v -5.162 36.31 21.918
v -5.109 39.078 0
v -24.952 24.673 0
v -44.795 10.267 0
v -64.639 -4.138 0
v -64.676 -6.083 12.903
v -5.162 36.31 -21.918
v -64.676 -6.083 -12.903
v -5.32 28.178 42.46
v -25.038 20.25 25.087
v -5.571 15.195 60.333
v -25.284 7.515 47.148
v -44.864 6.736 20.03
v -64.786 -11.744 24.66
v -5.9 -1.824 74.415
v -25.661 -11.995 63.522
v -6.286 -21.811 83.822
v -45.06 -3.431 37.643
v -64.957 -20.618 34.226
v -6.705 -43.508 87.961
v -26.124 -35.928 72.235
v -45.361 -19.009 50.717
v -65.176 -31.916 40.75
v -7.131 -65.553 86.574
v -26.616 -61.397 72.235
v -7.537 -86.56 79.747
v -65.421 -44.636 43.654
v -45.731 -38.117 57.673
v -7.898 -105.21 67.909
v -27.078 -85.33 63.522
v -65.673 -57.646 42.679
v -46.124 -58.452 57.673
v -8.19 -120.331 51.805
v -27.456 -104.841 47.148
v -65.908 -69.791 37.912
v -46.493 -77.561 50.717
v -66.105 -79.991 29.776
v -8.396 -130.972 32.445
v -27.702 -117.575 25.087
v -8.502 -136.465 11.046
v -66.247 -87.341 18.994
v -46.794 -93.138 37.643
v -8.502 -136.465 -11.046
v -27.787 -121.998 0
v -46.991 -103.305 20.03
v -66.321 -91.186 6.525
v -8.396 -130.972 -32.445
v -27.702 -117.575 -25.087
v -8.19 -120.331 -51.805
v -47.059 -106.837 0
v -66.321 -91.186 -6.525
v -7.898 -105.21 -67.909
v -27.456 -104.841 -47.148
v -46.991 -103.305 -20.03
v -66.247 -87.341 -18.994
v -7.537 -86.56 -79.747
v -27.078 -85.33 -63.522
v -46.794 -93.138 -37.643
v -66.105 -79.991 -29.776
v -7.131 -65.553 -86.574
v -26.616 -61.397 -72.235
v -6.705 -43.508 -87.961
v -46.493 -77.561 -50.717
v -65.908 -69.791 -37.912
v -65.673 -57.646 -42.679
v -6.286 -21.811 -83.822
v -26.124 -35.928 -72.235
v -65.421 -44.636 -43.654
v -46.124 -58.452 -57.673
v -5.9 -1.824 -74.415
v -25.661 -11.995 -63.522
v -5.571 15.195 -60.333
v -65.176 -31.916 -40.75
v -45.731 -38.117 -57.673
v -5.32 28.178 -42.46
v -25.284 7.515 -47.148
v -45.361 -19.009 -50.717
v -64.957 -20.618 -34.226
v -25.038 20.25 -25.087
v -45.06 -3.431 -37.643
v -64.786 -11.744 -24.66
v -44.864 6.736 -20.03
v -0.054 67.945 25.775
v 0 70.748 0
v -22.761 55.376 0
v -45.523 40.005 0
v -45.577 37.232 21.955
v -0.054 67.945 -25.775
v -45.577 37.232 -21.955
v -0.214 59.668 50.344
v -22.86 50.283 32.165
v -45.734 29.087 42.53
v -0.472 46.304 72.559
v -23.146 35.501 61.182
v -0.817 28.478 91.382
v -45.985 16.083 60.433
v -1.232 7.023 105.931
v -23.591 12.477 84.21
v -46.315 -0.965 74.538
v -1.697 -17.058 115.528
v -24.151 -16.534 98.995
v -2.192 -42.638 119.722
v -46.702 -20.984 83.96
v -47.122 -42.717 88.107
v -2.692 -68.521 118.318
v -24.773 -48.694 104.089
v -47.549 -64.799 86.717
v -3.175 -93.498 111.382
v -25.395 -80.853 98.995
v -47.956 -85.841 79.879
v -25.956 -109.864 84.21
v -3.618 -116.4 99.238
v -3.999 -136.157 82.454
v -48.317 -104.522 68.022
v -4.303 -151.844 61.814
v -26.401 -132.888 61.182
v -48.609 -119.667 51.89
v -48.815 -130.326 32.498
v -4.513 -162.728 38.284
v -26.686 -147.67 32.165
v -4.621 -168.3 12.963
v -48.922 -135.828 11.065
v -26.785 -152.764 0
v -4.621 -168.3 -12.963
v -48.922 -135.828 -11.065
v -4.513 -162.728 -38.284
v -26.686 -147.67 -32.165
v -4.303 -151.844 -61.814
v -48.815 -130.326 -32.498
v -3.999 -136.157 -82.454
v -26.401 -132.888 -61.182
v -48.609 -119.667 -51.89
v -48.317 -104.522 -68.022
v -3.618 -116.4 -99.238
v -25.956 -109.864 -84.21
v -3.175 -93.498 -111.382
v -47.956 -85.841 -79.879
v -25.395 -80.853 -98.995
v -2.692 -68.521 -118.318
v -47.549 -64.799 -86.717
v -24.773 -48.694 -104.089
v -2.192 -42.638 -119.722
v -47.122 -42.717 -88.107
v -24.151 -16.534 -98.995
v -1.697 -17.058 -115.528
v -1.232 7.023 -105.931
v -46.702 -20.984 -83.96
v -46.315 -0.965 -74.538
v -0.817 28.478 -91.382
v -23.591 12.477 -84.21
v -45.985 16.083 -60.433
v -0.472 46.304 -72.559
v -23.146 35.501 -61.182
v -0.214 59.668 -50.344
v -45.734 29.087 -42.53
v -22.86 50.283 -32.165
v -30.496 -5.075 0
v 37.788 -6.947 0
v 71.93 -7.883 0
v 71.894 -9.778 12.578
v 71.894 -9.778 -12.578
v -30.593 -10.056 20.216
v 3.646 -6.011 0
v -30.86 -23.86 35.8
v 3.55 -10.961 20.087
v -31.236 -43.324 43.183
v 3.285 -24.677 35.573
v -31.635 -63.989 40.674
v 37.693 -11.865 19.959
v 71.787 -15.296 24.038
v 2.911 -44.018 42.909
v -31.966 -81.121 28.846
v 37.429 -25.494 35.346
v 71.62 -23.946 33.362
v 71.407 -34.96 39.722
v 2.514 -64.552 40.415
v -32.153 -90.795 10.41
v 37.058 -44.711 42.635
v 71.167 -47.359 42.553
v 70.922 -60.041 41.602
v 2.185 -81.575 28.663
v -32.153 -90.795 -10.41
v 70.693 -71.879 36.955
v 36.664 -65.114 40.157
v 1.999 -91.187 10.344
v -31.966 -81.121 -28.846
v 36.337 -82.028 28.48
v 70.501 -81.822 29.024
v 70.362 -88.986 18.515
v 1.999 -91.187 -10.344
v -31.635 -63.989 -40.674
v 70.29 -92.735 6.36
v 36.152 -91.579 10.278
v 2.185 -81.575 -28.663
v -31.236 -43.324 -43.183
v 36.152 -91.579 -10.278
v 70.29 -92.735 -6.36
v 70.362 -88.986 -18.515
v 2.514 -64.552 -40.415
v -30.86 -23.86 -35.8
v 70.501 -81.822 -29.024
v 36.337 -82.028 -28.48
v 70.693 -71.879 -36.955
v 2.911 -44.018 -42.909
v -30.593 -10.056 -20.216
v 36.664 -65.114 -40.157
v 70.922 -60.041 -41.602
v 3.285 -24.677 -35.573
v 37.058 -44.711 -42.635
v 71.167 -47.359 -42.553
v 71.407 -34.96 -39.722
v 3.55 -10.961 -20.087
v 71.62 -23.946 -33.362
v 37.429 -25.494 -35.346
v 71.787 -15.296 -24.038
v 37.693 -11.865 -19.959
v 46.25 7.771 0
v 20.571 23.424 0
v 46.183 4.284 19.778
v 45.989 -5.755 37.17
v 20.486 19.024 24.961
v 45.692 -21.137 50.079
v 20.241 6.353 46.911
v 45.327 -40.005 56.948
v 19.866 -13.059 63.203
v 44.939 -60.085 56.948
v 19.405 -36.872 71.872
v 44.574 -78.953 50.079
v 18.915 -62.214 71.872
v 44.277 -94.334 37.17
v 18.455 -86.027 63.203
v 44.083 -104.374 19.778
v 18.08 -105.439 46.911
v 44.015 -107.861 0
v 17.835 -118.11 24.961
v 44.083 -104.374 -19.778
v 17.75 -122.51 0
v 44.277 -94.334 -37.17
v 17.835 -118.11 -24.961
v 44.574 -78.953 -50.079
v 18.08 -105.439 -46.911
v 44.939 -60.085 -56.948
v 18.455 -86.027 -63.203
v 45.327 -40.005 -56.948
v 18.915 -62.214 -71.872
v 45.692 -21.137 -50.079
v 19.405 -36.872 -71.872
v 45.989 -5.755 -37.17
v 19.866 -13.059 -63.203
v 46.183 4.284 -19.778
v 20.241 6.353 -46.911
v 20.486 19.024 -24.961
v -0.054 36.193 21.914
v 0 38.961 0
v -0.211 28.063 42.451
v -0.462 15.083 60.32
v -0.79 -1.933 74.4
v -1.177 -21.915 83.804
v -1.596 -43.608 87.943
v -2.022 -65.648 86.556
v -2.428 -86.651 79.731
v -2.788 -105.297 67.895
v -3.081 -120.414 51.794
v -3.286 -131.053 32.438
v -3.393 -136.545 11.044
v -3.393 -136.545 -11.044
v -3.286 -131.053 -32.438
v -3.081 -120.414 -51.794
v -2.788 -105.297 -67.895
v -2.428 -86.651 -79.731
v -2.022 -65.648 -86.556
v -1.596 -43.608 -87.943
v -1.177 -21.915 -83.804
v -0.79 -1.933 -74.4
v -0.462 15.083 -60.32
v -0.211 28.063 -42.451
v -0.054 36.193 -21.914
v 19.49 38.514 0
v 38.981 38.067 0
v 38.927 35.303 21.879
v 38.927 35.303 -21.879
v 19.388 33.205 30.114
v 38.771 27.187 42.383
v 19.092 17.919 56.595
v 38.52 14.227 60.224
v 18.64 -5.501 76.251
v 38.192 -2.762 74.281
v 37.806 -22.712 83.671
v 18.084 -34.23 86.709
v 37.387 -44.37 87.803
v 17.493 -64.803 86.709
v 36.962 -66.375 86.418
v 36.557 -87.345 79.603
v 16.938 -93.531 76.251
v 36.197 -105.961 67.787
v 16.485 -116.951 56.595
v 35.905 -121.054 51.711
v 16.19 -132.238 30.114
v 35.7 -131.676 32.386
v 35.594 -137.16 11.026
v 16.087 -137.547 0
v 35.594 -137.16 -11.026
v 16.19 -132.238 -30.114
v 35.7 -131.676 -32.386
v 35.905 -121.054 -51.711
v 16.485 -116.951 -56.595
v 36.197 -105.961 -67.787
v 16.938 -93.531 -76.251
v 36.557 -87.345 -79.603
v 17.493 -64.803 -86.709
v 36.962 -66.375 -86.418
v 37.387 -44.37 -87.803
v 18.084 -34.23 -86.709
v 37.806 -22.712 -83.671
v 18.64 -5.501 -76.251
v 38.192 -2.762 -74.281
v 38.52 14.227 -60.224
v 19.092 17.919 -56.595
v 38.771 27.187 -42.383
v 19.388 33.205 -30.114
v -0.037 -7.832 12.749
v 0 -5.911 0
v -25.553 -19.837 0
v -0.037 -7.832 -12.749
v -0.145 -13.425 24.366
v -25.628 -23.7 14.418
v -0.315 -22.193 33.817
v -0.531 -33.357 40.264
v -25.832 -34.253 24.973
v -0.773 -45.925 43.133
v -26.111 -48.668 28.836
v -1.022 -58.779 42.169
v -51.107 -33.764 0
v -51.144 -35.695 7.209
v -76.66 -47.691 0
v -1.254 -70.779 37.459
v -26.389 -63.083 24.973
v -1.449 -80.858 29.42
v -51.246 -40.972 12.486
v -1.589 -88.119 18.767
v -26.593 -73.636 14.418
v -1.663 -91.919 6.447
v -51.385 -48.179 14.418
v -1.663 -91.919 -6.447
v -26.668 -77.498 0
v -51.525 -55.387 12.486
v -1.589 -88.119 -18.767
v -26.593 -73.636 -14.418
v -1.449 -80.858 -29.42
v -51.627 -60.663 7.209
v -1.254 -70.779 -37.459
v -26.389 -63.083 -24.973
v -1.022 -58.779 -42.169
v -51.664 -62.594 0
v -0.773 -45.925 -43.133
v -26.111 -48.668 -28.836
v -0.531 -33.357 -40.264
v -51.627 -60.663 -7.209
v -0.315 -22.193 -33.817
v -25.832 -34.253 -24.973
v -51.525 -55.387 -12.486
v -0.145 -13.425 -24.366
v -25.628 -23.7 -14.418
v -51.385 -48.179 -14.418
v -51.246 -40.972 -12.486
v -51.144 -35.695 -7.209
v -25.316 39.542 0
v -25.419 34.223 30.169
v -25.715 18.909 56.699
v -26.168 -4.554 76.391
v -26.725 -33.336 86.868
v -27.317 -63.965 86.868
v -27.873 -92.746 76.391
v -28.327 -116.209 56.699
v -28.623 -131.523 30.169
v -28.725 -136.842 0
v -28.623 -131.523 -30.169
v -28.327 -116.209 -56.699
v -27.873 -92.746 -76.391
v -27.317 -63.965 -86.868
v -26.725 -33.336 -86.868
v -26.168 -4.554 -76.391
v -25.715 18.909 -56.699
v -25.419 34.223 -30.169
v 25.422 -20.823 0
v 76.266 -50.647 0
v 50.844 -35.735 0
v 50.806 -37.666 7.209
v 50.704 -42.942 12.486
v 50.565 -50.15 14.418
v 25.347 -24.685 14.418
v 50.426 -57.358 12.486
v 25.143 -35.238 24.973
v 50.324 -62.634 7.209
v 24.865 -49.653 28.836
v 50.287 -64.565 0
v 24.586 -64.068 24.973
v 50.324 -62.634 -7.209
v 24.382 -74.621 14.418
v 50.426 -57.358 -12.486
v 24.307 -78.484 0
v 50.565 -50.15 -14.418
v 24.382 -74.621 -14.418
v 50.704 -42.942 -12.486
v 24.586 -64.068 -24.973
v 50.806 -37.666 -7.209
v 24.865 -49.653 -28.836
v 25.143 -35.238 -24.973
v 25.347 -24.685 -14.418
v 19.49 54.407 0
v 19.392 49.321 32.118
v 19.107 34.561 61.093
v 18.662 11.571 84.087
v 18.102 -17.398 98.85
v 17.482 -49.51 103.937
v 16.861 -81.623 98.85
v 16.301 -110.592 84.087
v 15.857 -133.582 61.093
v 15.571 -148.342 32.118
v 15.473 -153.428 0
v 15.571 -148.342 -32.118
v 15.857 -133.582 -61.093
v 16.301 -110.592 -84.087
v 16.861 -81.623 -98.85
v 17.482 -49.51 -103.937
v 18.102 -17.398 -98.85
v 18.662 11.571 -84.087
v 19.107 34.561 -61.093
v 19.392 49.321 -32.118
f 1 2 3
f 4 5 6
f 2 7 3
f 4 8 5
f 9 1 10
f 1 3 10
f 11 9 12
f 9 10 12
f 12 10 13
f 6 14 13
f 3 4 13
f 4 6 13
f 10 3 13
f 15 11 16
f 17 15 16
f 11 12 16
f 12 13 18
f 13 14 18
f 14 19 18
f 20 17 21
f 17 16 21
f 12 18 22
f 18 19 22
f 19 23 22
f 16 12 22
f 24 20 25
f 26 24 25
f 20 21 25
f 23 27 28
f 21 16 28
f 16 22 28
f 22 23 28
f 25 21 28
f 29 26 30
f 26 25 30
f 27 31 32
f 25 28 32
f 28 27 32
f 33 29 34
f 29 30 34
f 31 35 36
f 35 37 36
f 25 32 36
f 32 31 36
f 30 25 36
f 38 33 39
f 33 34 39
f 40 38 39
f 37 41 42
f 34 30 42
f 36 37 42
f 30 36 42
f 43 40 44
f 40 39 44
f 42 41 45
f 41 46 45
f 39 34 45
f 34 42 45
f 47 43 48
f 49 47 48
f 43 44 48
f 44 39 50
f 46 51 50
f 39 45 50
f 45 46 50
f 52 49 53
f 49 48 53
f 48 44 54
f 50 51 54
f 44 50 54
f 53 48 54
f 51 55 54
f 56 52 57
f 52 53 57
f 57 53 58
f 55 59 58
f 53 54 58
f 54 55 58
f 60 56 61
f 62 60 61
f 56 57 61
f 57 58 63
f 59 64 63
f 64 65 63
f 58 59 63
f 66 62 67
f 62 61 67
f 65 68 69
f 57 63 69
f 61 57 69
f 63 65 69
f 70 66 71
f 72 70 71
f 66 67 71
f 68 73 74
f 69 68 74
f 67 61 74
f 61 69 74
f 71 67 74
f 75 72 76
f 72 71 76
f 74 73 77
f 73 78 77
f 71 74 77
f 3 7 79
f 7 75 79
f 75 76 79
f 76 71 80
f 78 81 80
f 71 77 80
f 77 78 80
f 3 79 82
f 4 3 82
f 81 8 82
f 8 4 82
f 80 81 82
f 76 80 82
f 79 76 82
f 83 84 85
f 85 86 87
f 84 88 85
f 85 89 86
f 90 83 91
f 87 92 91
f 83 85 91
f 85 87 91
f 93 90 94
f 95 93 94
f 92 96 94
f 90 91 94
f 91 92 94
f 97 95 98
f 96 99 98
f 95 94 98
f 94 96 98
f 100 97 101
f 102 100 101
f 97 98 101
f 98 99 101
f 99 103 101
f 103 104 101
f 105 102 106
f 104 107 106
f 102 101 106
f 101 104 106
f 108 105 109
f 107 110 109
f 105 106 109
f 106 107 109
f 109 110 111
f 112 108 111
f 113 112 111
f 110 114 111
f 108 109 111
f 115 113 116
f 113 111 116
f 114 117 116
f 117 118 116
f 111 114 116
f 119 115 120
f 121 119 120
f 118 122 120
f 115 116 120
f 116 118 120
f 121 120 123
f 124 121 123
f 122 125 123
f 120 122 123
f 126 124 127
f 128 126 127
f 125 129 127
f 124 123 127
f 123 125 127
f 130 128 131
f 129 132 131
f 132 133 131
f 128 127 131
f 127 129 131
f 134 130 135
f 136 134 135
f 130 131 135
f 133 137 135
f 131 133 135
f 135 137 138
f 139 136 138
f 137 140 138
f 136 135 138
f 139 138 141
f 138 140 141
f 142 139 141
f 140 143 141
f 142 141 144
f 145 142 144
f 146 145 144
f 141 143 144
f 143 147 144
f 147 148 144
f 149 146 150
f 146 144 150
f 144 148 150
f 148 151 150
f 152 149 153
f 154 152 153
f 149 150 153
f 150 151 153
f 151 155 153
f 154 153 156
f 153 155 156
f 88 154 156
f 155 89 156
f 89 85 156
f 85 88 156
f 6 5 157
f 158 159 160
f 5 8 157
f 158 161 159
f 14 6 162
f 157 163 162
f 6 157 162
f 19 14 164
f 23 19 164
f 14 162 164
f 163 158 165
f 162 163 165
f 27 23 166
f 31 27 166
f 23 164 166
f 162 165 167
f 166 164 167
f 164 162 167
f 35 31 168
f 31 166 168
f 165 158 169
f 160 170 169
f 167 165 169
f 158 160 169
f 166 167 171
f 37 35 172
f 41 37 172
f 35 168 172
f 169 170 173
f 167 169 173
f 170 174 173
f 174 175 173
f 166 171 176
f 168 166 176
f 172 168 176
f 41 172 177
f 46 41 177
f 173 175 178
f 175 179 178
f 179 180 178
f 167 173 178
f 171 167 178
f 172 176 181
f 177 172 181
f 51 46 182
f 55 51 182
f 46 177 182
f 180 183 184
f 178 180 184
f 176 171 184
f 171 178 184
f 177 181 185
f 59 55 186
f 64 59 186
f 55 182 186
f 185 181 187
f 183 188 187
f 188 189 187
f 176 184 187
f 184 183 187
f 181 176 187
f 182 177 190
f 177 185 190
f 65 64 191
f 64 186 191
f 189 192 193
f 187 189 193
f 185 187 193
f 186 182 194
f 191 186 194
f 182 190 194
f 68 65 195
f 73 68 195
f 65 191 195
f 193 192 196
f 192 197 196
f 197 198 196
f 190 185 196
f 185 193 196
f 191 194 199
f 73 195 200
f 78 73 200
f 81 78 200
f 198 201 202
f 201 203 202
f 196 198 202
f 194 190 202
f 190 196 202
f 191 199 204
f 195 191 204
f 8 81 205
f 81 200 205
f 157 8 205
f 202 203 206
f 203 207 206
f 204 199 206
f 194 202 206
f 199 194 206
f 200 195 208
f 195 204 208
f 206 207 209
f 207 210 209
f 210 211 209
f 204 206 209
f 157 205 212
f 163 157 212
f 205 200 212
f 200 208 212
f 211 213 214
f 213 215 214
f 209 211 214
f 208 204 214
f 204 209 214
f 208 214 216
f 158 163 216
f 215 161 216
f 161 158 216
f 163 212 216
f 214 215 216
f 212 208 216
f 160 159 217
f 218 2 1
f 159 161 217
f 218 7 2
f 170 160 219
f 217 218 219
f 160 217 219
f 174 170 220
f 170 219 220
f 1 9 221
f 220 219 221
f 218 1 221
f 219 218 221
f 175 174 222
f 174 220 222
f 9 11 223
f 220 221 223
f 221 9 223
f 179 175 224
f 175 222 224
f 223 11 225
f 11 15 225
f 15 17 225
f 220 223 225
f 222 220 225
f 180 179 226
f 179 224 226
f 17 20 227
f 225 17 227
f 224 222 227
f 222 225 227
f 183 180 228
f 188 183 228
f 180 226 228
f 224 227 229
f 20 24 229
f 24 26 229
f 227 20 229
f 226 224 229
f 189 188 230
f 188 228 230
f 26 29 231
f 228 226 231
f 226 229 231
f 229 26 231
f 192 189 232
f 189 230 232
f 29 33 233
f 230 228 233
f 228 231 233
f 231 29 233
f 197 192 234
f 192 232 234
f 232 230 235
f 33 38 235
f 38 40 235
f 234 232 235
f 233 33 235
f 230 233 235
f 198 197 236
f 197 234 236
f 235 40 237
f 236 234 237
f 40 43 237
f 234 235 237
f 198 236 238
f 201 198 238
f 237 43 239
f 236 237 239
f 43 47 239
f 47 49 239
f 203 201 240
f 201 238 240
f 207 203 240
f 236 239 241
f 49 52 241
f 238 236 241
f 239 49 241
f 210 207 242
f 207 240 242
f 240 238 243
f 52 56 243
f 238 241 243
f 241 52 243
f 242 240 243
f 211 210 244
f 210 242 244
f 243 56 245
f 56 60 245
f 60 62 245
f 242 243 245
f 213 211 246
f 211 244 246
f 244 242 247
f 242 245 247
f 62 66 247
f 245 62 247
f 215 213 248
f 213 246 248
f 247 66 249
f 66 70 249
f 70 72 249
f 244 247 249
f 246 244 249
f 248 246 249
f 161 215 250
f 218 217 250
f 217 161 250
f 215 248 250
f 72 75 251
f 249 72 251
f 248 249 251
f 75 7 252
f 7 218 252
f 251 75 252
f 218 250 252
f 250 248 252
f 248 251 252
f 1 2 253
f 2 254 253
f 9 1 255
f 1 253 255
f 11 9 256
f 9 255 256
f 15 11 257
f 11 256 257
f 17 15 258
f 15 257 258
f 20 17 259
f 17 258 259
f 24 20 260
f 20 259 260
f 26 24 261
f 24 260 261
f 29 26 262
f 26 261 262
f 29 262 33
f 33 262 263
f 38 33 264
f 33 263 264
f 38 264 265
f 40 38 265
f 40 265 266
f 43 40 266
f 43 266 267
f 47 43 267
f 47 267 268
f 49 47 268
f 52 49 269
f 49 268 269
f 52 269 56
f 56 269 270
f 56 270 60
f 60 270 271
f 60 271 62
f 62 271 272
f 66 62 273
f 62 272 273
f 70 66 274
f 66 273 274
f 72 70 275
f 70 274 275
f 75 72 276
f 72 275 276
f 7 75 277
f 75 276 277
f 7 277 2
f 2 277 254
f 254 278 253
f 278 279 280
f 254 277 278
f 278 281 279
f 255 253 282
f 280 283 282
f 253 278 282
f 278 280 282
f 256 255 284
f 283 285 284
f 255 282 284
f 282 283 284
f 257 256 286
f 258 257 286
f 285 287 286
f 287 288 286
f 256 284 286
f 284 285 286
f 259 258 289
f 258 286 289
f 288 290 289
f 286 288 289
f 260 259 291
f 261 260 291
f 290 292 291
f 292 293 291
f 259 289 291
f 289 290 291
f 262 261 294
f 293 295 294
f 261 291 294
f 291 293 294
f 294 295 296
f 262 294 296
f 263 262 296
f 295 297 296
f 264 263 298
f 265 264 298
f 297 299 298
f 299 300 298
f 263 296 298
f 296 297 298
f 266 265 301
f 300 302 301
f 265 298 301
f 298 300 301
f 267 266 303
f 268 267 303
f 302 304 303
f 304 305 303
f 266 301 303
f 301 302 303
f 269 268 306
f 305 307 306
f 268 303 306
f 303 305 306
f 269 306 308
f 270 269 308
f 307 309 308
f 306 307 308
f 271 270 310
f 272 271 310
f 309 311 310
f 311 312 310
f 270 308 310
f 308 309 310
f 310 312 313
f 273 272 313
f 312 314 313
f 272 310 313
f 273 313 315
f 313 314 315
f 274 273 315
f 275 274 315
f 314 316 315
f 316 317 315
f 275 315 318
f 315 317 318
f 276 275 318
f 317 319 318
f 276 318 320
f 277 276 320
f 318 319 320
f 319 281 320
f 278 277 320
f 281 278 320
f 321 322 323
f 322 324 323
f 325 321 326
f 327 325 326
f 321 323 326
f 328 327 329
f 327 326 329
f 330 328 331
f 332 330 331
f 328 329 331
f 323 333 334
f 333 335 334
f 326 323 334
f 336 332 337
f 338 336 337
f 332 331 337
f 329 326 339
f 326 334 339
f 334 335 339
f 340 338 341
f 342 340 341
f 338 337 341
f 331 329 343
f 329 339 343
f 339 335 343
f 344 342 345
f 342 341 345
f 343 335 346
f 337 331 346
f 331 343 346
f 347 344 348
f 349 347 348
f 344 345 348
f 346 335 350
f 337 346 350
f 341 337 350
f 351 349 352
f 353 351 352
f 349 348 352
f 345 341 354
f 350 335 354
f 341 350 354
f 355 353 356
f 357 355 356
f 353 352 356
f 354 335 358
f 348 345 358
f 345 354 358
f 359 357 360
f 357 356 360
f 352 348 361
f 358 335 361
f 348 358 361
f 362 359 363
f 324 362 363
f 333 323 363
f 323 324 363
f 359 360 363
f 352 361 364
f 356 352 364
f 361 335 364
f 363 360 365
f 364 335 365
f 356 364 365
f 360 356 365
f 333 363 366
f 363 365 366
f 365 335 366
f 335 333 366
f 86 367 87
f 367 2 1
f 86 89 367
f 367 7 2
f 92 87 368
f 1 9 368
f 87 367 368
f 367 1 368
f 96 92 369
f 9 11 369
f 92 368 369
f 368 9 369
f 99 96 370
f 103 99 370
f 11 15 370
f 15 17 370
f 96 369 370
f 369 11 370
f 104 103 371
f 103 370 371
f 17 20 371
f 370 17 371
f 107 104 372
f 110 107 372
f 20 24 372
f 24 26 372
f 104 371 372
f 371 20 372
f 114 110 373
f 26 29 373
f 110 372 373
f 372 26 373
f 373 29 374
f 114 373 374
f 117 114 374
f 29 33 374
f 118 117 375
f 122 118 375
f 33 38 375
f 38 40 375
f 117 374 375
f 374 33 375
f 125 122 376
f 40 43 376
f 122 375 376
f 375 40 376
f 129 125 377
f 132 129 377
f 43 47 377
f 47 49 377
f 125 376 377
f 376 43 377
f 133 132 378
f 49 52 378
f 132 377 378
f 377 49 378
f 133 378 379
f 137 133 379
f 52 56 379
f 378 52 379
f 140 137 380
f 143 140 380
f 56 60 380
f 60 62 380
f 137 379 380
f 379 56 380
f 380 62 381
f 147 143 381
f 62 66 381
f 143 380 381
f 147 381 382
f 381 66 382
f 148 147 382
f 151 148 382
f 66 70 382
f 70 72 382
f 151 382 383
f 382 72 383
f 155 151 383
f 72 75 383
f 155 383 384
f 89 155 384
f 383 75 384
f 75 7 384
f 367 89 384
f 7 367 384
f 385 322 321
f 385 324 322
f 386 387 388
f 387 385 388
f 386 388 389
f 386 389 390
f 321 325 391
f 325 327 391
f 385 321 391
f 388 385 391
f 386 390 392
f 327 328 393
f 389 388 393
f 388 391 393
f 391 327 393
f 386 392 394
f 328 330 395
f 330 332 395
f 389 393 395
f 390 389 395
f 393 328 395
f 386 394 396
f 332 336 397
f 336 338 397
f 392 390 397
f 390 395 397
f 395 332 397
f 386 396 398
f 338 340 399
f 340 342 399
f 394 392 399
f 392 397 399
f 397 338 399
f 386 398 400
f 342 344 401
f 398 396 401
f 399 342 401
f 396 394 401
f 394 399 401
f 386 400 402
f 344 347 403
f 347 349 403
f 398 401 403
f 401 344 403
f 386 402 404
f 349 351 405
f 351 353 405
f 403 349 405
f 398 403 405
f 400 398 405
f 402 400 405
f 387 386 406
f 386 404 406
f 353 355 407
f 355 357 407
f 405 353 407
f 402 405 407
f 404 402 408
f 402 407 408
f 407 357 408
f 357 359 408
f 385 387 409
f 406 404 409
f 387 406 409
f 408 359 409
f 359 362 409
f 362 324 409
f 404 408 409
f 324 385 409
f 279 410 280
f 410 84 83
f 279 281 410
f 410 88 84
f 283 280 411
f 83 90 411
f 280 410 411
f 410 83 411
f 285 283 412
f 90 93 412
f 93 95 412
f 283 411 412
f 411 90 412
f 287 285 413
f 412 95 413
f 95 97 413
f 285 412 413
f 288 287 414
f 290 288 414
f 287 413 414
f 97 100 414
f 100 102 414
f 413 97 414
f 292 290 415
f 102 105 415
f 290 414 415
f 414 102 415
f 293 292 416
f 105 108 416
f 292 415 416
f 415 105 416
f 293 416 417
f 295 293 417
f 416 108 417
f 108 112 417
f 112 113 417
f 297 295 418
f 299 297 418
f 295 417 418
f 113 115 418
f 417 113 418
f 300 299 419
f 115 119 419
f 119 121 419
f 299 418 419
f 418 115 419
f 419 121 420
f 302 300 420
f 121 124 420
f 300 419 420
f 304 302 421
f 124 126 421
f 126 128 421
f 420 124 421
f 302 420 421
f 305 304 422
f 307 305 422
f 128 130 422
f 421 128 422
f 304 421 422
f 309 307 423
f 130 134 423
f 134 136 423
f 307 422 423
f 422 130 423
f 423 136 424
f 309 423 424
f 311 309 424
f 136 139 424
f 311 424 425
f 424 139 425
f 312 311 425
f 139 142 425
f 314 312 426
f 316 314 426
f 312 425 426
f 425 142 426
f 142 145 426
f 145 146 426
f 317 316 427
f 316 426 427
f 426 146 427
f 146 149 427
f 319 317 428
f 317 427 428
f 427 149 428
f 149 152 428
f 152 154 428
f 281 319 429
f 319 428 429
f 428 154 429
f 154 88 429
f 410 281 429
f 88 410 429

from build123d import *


with BuildPart() as f1:
    # F0 (on Top) → F1 (revolve)
    with BuildSketch(Plane.XY):
        Polygon((0, 38.9608962168), (0, 70.7477629185), (-45.5229319632, 40.0050021708), (-5.1088934684, 39.078072898), align=None)
        Polygon((38.9808552181, 38.0668381833), (0, 70.7477629185), (0, 38.9608962168), align=None)
    revolve(axis=Axis((-0.1970678568, -49.1687059402, 0), (0.9998132301, -0.0193262749, 0)))


with BuildPart() as f1b:
    # F0 (on Top) → F1, piece 2 (revolve)
    with BuildSketch(Plane.XY):
        Polygon((71.9301700592, -7.8827580437), (0, 35.9638361526), (0, -5.9106468893), align=None)
        Polygon((0, 35.9638361526), (-5.1088934684, 39.078072898), (-64.6386221051, -4.1384482756), (0, -5.9106468893), align=None)
    revolve(axis=Axis((-0.1970678568, -49.1687059402, 0), (0.9998132301, -0.0193262749, 0)))


with BuildPart() as f1c:
    # F0 (on Top) → F1, piece 3 (revolve)
    with BuildSketch(Plane.XY):
        Polygon((76.2656927109, -50.6467223167), (0, -5.9106468893), (0, -49.1725152393), align=None)
        Polygon((0, -49.1725152393), (0, -5.9106468893), (-76.6598284245, -47.6906895638), align=None)
    revolve(axis=Axis((-0.1970678568, -49.1687059402, 0), (0.9998132301, -0.0193262749, 0)))


solid = Compound([f1.part, f1b.part, f1c.part])
